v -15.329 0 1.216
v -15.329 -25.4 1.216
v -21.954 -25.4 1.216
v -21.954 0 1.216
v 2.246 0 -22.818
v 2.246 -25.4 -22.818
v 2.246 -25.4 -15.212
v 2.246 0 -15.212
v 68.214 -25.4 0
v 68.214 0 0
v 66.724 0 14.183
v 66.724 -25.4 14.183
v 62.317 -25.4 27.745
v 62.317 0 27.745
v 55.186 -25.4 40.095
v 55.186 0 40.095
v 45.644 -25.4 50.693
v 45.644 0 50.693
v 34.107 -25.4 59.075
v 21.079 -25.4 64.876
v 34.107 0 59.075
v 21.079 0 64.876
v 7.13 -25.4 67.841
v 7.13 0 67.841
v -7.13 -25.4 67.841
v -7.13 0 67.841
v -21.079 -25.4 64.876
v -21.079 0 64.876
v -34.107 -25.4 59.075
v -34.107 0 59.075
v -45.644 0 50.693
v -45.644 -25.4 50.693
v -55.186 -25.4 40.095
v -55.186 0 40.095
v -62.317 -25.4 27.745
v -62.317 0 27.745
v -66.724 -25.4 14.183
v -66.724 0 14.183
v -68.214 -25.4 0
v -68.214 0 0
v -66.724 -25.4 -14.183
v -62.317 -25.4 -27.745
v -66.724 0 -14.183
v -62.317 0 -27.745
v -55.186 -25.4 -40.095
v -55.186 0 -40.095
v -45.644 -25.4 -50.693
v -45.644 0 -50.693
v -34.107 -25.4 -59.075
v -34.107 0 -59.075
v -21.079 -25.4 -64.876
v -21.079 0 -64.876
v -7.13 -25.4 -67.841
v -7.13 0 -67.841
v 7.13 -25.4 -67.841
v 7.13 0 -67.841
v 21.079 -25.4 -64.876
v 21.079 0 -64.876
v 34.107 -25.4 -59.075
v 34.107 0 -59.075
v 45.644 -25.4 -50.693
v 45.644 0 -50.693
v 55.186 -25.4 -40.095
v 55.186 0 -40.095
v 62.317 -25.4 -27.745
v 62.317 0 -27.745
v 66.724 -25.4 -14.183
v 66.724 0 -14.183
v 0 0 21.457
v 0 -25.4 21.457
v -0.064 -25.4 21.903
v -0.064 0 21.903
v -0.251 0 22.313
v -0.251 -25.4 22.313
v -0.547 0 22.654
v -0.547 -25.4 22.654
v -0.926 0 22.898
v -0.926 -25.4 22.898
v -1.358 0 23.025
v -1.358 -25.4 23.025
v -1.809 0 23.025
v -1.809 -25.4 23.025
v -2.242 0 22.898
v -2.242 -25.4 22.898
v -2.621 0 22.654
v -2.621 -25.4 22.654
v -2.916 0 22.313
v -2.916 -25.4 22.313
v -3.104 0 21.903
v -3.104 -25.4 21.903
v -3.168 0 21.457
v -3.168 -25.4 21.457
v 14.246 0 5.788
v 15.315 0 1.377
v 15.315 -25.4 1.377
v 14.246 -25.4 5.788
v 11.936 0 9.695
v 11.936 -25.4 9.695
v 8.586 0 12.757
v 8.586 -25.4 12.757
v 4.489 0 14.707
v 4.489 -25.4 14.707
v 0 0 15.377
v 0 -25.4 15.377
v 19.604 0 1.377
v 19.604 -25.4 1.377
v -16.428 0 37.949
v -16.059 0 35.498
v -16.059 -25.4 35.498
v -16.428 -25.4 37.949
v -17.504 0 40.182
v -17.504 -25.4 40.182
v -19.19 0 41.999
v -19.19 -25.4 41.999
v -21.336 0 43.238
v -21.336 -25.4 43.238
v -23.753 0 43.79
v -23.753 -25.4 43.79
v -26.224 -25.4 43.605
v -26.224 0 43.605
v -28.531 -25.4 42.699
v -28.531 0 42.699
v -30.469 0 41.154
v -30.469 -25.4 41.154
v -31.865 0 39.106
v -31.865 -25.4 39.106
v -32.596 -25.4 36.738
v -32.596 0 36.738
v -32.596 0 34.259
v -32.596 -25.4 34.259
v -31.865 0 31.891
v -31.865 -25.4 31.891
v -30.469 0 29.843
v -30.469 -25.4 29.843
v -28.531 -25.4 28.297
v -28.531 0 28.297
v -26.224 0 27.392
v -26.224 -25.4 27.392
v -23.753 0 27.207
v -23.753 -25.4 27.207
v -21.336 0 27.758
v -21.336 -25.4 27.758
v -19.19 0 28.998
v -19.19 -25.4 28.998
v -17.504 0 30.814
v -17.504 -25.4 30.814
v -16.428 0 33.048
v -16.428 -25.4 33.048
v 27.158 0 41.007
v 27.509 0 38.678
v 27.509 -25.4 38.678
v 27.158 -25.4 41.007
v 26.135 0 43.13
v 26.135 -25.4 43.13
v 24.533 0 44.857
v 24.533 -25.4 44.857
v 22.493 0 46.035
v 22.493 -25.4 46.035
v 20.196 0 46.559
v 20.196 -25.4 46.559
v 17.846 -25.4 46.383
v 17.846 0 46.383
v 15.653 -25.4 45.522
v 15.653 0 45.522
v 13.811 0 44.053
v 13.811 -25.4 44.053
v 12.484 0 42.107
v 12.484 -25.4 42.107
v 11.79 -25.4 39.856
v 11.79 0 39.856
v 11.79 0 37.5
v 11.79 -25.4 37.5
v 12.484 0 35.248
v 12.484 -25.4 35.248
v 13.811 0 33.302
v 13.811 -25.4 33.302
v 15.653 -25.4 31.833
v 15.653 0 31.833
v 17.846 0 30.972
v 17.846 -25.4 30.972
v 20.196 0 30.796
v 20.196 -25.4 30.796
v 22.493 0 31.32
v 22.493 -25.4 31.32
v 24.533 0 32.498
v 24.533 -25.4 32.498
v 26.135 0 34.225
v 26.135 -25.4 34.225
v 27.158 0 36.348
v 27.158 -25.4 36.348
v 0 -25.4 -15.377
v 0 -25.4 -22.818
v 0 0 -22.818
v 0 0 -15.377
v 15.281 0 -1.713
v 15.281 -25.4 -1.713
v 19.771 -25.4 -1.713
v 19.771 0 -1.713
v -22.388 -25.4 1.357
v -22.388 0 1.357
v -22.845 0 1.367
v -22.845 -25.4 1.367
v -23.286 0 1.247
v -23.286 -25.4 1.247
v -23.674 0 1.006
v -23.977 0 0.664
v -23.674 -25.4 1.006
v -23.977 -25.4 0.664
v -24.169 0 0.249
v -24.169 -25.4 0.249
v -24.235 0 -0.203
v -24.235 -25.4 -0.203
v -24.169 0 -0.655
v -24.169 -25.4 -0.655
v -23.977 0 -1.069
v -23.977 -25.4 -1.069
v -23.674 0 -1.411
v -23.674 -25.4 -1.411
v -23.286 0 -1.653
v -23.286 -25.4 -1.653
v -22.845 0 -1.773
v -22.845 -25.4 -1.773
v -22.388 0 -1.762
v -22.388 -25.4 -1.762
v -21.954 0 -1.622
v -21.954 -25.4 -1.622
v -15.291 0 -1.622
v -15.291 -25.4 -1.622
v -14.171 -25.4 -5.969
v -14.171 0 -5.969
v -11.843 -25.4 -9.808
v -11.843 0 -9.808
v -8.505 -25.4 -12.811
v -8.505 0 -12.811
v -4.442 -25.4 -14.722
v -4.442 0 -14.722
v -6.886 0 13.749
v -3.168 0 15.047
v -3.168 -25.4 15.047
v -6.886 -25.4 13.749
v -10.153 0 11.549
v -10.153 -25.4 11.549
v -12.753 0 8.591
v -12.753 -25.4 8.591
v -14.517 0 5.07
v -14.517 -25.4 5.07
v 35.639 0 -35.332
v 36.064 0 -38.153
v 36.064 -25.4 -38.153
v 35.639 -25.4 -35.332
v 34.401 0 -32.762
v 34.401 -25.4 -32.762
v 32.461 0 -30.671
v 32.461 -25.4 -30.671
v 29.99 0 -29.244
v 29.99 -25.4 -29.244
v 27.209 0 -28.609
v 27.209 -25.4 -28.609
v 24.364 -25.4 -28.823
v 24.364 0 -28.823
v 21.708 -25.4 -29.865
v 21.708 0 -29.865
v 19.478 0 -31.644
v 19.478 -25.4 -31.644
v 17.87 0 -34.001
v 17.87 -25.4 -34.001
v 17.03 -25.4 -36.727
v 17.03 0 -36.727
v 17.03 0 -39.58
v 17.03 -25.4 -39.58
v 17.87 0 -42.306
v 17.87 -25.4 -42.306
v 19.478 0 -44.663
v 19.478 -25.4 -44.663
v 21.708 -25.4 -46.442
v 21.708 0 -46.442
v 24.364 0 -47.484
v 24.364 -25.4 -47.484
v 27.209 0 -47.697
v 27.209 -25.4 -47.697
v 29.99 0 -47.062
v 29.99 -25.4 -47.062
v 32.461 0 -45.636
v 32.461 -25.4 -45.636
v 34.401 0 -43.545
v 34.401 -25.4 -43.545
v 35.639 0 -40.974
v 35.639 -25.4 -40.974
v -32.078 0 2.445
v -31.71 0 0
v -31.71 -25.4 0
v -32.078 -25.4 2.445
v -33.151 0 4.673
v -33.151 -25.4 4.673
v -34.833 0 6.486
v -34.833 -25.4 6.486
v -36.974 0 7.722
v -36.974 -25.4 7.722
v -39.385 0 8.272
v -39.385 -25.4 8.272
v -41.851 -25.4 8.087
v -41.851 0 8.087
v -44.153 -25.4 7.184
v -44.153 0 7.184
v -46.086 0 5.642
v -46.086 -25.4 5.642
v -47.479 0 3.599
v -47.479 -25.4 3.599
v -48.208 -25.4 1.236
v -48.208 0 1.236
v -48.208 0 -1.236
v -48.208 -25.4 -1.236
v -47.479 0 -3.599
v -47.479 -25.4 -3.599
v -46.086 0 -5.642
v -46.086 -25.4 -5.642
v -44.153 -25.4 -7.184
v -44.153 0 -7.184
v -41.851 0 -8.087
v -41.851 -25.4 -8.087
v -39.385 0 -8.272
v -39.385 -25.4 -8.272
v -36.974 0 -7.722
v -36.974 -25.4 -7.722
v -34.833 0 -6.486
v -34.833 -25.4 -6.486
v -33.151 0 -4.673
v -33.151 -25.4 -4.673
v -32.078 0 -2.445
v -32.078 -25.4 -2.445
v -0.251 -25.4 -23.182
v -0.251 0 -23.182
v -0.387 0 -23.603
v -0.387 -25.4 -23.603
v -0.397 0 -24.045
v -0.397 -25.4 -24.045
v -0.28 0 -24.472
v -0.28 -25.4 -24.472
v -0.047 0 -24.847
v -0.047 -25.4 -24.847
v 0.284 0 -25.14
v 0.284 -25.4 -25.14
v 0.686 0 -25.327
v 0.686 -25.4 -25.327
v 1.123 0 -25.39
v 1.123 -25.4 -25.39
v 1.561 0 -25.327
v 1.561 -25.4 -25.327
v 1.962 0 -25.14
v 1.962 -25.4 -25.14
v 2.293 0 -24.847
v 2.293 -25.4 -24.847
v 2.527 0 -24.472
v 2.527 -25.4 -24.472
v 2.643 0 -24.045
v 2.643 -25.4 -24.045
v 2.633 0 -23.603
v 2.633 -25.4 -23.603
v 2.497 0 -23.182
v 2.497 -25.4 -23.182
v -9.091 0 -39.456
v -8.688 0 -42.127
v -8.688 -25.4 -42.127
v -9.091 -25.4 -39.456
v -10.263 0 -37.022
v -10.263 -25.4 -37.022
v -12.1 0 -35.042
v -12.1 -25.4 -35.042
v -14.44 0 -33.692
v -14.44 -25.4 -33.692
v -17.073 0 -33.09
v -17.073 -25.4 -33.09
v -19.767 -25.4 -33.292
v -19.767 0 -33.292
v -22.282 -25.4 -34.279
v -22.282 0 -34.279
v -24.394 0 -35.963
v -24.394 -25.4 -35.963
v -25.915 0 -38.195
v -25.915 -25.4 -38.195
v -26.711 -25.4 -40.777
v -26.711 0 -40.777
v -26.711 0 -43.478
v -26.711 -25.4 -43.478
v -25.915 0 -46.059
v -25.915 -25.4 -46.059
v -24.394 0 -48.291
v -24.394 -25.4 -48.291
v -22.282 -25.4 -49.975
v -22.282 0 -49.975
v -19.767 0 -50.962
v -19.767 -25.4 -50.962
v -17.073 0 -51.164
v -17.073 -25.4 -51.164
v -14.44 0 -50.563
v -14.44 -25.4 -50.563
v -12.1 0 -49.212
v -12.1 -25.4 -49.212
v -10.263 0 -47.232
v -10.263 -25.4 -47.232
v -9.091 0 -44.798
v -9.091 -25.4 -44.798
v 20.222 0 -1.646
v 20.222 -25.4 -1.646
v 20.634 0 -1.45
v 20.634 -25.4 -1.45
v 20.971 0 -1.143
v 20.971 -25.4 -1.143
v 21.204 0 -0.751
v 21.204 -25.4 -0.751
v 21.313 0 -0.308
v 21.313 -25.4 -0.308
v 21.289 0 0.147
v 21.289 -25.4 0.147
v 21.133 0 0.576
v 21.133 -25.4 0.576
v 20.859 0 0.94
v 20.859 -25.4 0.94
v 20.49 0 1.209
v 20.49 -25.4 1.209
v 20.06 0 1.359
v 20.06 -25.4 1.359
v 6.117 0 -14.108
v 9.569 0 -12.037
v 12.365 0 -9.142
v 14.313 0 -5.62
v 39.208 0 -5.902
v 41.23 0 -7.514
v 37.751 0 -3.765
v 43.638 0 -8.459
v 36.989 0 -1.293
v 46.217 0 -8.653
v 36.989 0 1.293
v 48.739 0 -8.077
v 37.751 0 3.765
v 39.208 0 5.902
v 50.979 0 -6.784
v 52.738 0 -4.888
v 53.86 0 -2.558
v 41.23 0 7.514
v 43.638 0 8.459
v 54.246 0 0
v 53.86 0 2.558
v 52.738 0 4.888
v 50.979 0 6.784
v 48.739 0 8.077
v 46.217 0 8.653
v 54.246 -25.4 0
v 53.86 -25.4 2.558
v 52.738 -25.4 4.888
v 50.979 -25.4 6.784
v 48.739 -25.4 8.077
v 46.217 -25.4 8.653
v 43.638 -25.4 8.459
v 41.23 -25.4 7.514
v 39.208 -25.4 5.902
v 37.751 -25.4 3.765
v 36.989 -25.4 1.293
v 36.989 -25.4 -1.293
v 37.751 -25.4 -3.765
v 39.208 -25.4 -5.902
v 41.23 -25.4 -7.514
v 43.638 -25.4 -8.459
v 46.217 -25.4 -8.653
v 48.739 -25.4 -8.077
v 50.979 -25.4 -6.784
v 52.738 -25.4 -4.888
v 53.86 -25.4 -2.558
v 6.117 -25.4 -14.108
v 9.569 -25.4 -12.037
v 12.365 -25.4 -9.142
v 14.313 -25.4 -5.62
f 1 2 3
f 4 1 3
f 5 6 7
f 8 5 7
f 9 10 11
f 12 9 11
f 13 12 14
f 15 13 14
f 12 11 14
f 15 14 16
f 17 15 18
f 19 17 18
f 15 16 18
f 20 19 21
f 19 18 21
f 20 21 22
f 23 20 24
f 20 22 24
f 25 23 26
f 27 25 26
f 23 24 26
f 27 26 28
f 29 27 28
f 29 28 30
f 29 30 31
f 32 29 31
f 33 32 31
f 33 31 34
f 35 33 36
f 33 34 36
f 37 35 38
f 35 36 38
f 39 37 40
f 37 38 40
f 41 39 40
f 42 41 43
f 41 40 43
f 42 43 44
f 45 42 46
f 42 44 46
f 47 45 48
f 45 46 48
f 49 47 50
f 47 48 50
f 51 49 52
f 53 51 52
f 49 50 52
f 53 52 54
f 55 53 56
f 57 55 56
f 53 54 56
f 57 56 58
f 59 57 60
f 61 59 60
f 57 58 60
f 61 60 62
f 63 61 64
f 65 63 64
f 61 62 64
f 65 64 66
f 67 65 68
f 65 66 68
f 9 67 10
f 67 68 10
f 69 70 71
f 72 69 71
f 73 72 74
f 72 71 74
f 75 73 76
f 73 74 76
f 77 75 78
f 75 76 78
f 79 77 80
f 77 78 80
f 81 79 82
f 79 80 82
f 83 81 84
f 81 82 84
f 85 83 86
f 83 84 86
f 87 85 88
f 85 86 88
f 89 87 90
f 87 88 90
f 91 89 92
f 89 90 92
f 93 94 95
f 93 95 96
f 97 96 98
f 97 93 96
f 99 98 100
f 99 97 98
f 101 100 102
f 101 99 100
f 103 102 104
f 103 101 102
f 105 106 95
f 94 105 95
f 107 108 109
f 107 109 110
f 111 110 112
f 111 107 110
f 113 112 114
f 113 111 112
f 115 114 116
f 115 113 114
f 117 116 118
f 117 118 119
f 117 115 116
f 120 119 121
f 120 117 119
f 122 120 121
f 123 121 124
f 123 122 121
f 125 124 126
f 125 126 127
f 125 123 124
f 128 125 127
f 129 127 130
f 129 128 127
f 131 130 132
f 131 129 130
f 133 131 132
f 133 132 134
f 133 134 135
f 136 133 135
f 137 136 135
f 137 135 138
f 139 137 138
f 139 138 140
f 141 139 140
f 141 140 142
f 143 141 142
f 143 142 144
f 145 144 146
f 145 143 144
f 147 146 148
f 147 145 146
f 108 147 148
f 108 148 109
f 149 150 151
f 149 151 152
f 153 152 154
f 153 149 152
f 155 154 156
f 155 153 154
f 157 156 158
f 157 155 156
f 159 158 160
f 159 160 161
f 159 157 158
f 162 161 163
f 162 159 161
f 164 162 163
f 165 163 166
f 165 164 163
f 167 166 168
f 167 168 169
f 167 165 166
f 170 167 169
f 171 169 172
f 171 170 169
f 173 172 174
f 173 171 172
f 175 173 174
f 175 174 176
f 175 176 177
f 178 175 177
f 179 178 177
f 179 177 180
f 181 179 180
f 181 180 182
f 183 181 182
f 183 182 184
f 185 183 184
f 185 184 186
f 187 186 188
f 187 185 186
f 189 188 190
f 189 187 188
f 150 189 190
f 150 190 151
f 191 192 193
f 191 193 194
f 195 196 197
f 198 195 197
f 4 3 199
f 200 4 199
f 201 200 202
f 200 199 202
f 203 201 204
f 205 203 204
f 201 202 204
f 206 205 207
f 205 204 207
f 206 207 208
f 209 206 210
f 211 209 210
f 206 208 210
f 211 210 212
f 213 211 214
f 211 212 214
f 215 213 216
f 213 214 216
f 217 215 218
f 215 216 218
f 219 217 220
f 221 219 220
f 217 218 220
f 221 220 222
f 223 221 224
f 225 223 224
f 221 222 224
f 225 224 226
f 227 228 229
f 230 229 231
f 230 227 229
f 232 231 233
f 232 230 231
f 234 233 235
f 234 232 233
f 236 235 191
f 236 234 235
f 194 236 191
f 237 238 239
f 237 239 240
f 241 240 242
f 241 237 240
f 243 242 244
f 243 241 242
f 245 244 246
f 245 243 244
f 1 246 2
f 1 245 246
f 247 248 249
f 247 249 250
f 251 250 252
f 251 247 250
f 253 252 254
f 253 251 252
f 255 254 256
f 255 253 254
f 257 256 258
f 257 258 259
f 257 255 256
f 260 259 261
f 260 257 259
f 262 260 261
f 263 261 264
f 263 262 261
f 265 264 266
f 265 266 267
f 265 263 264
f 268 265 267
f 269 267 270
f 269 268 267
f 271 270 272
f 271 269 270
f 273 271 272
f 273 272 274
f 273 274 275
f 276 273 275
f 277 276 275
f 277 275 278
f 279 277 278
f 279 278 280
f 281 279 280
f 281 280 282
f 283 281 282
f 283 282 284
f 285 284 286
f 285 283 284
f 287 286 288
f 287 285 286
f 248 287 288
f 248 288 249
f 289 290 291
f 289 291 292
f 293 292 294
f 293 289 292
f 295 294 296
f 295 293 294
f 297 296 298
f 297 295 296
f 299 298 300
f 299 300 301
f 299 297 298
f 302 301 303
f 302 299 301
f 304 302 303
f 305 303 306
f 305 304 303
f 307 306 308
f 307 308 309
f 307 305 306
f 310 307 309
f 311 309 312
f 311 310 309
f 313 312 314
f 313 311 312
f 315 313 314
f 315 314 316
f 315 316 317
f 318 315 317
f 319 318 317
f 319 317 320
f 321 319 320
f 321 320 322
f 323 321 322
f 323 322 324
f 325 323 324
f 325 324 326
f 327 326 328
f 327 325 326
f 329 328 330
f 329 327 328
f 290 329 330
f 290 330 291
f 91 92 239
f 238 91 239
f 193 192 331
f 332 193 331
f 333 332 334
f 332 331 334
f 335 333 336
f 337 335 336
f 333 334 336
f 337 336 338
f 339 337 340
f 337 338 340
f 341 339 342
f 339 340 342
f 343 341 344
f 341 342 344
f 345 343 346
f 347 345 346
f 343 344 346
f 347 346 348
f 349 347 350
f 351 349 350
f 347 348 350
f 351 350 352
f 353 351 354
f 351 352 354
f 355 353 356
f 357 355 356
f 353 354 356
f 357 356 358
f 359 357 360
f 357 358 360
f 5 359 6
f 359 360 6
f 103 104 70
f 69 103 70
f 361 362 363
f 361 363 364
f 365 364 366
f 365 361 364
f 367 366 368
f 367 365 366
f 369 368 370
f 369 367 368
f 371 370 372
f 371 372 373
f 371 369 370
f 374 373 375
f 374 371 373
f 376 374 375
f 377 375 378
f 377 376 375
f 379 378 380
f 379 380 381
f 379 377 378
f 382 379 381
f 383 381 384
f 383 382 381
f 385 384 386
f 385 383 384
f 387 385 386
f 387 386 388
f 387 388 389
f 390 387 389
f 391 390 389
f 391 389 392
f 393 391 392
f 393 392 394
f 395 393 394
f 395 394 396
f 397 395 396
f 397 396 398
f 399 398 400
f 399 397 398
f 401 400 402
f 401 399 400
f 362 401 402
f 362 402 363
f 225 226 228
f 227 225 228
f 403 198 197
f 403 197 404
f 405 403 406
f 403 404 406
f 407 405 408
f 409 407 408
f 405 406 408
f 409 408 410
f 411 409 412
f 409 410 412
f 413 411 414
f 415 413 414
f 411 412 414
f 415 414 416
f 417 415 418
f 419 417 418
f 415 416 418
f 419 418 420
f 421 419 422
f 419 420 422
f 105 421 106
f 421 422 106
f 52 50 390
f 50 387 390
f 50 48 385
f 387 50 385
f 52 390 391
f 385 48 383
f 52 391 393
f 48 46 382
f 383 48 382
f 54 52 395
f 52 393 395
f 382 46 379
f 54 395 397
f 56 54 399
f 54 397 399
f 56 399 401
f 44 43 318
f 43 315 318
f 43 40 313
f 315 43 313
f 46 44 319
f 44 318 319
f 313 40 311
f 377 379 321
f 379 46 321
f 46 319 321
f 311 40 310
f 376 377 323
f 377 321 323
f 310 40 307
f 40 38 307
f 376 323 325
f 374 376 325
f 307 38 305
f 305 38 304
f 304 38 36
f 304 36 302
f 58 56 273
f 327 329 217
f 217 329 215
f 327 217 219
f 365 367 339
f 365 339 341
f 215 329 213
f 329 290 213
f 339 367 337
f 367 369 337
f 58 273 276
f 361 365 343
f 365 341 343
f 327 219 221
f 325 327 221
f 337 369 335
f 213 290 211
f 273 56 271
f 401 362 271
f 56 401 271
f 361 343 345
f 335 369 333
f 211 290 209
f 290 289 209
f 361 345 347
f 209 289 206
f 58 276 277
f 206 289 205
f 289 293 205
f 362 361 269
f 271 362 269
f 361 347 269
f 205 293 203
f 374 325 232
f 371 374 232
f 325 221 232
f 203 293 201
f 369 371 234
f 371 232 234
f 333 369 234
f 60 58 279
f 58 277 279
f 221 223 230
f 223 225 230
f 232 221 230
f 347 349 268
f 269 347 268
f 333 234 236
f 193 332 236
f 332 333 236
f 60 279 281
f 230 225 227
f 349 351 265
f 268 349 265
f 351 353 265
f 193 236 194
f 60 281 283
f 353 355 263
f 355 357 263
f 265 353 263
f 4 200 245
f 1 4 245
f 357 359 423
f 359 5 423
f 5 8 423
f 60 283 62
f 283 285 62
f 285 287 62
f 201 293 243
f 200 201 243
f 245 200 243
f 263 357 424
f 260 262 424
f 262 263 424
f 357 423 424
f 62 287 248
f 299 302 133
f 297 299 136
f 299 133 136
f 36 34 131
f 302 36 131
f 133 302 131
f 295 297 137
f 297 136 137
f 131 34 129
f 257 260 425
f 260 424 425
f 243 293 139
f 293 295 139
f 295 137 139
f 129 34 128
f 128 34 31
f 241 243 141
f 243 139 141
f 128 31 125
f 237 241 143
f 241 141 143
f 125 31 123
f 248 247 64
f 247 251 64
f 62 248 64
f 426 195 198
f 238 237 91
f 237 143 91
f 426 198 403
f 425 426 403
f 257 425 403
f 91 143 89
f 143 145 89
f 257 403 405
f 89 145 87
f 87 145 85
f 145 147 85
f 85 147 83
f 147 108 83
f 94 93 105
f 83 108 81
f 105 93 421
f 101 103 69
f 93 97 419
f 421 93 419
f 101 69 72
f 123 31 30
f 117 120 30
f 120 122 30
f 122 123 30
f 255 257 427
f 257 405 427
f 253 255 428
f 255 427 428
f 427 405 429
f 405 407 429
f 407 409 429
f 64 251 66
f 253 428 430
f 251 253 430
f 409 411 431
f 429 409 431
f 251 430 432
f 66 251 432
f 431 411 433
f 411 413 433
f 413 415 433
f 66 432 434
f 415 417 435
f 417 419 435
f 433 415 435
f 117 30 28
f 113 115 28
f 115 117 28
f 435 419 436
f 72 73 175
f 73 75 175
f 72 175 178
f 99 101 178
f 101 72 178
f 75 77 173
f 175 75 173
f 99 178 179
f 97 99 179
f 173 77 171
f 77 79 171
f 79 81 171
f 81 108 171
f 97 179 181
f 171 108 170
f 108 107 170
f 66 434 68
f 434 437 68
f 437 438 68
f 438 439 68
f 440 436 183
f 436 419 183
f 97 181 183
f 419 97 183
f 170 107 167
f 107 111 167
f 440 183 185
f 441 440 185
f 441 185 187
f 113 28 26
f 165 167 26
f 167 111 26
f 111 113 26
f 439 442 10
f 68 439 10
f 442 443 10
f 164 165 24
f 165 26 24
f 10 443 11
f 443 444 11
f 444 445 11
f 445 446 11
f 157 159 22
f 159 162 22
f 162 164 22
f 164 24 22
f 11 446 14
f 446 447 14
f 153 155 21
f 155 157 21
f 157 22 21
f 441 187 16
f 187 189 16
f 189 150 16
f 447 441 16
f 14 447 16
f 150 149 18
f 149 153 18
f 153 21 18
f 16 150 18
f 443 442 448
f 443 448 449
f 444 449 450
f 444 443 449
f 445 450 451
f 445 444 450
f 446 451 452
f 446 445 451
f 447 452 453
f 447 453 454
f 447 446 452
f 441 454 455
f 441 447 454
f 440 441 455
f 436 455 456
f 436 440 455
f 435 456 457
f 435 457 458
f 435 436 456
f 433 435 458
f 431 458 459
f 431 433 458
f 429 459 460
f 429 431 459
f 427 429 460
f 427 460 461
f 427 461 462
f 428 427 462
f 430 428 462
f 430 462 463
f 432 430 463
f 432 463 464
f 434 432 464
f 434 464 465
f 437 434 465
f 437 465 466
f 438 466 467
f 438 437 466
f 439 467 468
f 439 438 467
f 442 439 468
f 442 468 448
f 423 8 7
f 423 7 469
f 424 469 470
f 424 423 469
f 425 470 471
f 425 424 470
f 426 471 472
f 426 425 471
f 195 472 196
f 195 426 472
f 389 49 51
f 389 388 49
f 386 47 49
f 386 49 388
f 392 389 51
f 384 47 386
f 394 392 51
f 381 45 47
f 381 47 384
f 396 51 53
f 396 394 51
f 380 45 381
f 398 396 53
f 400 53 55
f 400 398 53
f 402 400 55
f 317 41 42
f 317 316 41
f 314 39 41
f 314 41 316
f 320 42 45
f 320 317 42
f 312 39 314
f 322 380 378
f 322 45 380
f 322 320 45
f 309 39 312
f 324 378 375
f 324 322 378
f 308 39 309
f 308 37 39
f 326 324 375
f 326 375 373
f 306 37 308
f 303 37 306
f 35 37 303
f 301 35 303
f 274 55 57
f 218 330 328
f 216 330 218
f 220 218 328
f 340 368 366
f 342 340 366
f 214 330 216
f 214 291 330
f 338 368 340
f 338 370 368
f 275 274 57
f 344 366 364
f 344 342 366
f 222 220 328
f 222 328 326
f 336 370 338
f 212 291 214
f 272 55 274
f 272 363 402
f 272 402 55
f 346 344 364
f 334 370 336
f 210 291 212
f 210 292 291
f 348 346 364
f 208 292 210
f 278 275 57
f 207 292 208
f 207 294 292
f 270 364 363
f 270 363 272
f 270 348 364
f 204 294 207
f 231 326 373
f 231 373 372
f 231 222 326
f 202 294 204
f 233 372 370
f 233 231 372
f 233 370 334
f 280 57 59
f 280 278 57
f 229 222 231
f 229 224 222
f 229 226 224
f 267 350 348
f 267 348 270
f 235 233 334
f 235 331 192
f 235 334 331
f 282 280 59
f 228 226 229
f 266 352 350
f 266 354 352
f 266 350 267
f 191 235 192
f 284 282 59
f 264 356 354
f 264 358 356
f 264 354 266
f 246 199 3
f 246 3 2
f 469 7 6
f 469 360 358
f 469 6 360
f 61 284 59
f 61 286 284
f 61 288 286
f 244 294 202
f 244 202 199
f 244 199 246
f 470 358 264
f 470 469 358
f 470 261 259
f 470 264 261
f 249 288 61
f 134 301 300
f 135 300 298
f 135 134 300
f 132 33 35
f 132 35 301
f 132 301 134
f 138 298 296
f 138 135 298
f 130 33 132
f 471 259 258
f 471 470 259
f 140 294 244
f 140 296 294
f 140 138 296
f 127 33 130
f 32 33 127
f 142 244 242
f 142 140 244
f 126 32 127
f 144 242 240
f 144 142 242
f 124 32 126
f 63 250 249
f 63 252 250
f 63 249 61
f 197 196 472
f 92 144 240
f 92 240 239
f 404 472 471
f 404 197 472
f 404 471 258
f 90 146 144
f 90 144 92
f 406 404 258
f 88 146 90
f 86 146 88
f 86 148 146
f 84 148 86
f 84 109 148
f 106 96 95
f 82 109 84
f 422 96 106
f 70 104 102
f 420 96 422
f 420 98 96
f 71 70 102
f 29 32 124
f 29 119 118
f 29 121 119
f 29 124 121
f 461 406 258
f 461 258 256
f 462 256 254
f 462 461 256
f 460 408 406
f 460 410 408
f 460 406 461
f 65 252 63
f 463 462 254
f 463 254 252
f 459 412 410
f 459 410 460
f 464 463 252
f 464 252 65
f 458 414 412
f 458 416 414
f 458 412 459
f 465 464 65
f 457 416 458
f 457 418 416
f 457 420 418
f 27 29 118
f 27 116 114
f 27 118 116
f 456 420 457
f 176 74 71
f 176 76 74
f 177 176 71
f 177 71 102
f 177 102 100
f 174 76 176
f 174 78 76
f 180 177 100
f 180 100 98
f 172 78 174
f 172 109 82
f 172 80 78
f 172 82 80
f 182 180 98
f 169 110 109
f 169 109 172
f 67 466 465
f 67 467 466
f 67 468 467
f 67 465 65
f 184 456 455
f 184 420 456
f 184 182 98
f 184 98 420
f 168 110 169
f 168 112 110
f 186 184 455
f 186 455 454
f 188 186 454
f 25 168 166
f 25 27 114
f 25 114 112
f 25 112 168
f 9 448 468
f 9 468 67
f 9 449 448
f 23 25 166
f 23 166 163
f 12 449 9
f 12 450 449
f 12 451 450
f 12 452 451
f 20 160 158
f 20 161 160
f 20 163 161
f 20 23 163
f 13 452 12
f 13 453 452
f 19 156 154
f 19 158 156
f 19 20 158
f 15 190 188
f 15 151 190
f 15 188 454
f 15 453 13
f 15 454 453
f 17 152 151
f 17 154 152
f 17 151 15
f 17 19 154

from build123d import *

# Parameters (mm, degrees)
F0_R     = 68.2142
F0_R_2   = 9.06213
F0_R_3   = 9.570677
F0_R_4   = 8.295327
F0_R_5   = 8.314873
F0_R_6   = 15.377147
F0_R_7   = 8.676921
F0_R_8   = 7.903736
F1_DEPTH = 25.4
F3_DEPTH = 25.401
F4_W     = 2.246405
F4_H     = 9.179381
F5_DEPTH = 25.401


with BuildPart() as f1:
    # F0 (on Front) → F1 (new body)
    with BuildSketch(Plane.XZ):
        Circle(F0_R)
        with Locations((-17.750563, -42.127229)):
            Circle(F0_R_2, mode=Mode.SUBTRACT)
        with Locations((26.49338, -38.153224)):
            Circle(F0_R_3, mode=Mode.SUBTRACT)
        with Locations((-40.004998, 0)):
            Circle(F0_R_4, mode=Mode.SUBTRACT)
        with Locations((-24.373908, 35.498366)):
            Circle(F0_R_5, mode=Mode.SUBTRACT)
        Circle(F0_R_6, mode=Mode.SUBTRACT)
        with Locations((45.568611, 0)):
            Circle(F0_R_7, mode=Mode.SUBTRACT)
        with Locations((19.605096, 38.677573)):
            Circle(F0_R_8, mode=Mode.SUBTRACT)
    extrude(amount=F1_DEPTH)

    # F2 (on face) → F3 (cut, through all)
    with BuildSketch(Plane.XZ.offset(25.4)):
        Polygon((-3.167718, 21.456879), (-3.167718, 15.047332), (0, 15.377147), (0, 21.456879), align=None)
        with BuildLine():
            ThreePointArc((0, 21.456879), (-1.583859, 23.040738), (-3.167718, 21.456879))
            Line((-3.167718, 21.456879), (0, 21.456879))
        make_face()
    extrude(amount=-F3_DEPTH, mode=Mode.SUBTRACT)

    # F4 (on face) → F5 (cut, through all)
    with BuildSketch(Plane.XZ.offset(25.4)):
        with BuildLine():
            Line((19.603778, 1.377483), (15.315325, 1.377483))
            Line((15.315325, 1.377483), (13.762355, 0))
            Line((13.762355, 0), (15.281475, -1.712651))
            Line((15.281475, -1.712651), (19.770676, -1.712651))
            ThreePointArc((19.770676, -1.712651), (21.317995, -0.079506), (19.603778, 1.377483))
        make_face()
        Polygon((-13.441991, 1.215727), (-13.775786, 1.215727), (-13.775786, 0), (-13.775786, -1.621536), align=None)
        Polygon((-13.775786, 0), (-13.775786, 1.215727), (-21.95378, 1.215727), (-21.95378, -1.621536), (-13.775786, -1.621536), align=None)
        with BuildLine():
            Line((-21.95378, -1.621536), (-21.95378, 1.215727))
            ThreePointArc((-21.95378, 1.215727), (-24.235262, -0.202904), (-21.95378, -1.621536))
        make_face()
        with Locations((1.123202, -18.22787)):
            Rectangle(F4_W, F4_H)
        with BuildLine():
            Line((2.246405, -22.81756), (0, -22.81756))
            ThreePointArc((0, -22.81756), (1.123202, -25.390364), (2.246405, -22.81756))
        make_face()
    extrude(amount=-F5_DEPTH, mode=Mode.SUBTRACT)


solid = f1.part
